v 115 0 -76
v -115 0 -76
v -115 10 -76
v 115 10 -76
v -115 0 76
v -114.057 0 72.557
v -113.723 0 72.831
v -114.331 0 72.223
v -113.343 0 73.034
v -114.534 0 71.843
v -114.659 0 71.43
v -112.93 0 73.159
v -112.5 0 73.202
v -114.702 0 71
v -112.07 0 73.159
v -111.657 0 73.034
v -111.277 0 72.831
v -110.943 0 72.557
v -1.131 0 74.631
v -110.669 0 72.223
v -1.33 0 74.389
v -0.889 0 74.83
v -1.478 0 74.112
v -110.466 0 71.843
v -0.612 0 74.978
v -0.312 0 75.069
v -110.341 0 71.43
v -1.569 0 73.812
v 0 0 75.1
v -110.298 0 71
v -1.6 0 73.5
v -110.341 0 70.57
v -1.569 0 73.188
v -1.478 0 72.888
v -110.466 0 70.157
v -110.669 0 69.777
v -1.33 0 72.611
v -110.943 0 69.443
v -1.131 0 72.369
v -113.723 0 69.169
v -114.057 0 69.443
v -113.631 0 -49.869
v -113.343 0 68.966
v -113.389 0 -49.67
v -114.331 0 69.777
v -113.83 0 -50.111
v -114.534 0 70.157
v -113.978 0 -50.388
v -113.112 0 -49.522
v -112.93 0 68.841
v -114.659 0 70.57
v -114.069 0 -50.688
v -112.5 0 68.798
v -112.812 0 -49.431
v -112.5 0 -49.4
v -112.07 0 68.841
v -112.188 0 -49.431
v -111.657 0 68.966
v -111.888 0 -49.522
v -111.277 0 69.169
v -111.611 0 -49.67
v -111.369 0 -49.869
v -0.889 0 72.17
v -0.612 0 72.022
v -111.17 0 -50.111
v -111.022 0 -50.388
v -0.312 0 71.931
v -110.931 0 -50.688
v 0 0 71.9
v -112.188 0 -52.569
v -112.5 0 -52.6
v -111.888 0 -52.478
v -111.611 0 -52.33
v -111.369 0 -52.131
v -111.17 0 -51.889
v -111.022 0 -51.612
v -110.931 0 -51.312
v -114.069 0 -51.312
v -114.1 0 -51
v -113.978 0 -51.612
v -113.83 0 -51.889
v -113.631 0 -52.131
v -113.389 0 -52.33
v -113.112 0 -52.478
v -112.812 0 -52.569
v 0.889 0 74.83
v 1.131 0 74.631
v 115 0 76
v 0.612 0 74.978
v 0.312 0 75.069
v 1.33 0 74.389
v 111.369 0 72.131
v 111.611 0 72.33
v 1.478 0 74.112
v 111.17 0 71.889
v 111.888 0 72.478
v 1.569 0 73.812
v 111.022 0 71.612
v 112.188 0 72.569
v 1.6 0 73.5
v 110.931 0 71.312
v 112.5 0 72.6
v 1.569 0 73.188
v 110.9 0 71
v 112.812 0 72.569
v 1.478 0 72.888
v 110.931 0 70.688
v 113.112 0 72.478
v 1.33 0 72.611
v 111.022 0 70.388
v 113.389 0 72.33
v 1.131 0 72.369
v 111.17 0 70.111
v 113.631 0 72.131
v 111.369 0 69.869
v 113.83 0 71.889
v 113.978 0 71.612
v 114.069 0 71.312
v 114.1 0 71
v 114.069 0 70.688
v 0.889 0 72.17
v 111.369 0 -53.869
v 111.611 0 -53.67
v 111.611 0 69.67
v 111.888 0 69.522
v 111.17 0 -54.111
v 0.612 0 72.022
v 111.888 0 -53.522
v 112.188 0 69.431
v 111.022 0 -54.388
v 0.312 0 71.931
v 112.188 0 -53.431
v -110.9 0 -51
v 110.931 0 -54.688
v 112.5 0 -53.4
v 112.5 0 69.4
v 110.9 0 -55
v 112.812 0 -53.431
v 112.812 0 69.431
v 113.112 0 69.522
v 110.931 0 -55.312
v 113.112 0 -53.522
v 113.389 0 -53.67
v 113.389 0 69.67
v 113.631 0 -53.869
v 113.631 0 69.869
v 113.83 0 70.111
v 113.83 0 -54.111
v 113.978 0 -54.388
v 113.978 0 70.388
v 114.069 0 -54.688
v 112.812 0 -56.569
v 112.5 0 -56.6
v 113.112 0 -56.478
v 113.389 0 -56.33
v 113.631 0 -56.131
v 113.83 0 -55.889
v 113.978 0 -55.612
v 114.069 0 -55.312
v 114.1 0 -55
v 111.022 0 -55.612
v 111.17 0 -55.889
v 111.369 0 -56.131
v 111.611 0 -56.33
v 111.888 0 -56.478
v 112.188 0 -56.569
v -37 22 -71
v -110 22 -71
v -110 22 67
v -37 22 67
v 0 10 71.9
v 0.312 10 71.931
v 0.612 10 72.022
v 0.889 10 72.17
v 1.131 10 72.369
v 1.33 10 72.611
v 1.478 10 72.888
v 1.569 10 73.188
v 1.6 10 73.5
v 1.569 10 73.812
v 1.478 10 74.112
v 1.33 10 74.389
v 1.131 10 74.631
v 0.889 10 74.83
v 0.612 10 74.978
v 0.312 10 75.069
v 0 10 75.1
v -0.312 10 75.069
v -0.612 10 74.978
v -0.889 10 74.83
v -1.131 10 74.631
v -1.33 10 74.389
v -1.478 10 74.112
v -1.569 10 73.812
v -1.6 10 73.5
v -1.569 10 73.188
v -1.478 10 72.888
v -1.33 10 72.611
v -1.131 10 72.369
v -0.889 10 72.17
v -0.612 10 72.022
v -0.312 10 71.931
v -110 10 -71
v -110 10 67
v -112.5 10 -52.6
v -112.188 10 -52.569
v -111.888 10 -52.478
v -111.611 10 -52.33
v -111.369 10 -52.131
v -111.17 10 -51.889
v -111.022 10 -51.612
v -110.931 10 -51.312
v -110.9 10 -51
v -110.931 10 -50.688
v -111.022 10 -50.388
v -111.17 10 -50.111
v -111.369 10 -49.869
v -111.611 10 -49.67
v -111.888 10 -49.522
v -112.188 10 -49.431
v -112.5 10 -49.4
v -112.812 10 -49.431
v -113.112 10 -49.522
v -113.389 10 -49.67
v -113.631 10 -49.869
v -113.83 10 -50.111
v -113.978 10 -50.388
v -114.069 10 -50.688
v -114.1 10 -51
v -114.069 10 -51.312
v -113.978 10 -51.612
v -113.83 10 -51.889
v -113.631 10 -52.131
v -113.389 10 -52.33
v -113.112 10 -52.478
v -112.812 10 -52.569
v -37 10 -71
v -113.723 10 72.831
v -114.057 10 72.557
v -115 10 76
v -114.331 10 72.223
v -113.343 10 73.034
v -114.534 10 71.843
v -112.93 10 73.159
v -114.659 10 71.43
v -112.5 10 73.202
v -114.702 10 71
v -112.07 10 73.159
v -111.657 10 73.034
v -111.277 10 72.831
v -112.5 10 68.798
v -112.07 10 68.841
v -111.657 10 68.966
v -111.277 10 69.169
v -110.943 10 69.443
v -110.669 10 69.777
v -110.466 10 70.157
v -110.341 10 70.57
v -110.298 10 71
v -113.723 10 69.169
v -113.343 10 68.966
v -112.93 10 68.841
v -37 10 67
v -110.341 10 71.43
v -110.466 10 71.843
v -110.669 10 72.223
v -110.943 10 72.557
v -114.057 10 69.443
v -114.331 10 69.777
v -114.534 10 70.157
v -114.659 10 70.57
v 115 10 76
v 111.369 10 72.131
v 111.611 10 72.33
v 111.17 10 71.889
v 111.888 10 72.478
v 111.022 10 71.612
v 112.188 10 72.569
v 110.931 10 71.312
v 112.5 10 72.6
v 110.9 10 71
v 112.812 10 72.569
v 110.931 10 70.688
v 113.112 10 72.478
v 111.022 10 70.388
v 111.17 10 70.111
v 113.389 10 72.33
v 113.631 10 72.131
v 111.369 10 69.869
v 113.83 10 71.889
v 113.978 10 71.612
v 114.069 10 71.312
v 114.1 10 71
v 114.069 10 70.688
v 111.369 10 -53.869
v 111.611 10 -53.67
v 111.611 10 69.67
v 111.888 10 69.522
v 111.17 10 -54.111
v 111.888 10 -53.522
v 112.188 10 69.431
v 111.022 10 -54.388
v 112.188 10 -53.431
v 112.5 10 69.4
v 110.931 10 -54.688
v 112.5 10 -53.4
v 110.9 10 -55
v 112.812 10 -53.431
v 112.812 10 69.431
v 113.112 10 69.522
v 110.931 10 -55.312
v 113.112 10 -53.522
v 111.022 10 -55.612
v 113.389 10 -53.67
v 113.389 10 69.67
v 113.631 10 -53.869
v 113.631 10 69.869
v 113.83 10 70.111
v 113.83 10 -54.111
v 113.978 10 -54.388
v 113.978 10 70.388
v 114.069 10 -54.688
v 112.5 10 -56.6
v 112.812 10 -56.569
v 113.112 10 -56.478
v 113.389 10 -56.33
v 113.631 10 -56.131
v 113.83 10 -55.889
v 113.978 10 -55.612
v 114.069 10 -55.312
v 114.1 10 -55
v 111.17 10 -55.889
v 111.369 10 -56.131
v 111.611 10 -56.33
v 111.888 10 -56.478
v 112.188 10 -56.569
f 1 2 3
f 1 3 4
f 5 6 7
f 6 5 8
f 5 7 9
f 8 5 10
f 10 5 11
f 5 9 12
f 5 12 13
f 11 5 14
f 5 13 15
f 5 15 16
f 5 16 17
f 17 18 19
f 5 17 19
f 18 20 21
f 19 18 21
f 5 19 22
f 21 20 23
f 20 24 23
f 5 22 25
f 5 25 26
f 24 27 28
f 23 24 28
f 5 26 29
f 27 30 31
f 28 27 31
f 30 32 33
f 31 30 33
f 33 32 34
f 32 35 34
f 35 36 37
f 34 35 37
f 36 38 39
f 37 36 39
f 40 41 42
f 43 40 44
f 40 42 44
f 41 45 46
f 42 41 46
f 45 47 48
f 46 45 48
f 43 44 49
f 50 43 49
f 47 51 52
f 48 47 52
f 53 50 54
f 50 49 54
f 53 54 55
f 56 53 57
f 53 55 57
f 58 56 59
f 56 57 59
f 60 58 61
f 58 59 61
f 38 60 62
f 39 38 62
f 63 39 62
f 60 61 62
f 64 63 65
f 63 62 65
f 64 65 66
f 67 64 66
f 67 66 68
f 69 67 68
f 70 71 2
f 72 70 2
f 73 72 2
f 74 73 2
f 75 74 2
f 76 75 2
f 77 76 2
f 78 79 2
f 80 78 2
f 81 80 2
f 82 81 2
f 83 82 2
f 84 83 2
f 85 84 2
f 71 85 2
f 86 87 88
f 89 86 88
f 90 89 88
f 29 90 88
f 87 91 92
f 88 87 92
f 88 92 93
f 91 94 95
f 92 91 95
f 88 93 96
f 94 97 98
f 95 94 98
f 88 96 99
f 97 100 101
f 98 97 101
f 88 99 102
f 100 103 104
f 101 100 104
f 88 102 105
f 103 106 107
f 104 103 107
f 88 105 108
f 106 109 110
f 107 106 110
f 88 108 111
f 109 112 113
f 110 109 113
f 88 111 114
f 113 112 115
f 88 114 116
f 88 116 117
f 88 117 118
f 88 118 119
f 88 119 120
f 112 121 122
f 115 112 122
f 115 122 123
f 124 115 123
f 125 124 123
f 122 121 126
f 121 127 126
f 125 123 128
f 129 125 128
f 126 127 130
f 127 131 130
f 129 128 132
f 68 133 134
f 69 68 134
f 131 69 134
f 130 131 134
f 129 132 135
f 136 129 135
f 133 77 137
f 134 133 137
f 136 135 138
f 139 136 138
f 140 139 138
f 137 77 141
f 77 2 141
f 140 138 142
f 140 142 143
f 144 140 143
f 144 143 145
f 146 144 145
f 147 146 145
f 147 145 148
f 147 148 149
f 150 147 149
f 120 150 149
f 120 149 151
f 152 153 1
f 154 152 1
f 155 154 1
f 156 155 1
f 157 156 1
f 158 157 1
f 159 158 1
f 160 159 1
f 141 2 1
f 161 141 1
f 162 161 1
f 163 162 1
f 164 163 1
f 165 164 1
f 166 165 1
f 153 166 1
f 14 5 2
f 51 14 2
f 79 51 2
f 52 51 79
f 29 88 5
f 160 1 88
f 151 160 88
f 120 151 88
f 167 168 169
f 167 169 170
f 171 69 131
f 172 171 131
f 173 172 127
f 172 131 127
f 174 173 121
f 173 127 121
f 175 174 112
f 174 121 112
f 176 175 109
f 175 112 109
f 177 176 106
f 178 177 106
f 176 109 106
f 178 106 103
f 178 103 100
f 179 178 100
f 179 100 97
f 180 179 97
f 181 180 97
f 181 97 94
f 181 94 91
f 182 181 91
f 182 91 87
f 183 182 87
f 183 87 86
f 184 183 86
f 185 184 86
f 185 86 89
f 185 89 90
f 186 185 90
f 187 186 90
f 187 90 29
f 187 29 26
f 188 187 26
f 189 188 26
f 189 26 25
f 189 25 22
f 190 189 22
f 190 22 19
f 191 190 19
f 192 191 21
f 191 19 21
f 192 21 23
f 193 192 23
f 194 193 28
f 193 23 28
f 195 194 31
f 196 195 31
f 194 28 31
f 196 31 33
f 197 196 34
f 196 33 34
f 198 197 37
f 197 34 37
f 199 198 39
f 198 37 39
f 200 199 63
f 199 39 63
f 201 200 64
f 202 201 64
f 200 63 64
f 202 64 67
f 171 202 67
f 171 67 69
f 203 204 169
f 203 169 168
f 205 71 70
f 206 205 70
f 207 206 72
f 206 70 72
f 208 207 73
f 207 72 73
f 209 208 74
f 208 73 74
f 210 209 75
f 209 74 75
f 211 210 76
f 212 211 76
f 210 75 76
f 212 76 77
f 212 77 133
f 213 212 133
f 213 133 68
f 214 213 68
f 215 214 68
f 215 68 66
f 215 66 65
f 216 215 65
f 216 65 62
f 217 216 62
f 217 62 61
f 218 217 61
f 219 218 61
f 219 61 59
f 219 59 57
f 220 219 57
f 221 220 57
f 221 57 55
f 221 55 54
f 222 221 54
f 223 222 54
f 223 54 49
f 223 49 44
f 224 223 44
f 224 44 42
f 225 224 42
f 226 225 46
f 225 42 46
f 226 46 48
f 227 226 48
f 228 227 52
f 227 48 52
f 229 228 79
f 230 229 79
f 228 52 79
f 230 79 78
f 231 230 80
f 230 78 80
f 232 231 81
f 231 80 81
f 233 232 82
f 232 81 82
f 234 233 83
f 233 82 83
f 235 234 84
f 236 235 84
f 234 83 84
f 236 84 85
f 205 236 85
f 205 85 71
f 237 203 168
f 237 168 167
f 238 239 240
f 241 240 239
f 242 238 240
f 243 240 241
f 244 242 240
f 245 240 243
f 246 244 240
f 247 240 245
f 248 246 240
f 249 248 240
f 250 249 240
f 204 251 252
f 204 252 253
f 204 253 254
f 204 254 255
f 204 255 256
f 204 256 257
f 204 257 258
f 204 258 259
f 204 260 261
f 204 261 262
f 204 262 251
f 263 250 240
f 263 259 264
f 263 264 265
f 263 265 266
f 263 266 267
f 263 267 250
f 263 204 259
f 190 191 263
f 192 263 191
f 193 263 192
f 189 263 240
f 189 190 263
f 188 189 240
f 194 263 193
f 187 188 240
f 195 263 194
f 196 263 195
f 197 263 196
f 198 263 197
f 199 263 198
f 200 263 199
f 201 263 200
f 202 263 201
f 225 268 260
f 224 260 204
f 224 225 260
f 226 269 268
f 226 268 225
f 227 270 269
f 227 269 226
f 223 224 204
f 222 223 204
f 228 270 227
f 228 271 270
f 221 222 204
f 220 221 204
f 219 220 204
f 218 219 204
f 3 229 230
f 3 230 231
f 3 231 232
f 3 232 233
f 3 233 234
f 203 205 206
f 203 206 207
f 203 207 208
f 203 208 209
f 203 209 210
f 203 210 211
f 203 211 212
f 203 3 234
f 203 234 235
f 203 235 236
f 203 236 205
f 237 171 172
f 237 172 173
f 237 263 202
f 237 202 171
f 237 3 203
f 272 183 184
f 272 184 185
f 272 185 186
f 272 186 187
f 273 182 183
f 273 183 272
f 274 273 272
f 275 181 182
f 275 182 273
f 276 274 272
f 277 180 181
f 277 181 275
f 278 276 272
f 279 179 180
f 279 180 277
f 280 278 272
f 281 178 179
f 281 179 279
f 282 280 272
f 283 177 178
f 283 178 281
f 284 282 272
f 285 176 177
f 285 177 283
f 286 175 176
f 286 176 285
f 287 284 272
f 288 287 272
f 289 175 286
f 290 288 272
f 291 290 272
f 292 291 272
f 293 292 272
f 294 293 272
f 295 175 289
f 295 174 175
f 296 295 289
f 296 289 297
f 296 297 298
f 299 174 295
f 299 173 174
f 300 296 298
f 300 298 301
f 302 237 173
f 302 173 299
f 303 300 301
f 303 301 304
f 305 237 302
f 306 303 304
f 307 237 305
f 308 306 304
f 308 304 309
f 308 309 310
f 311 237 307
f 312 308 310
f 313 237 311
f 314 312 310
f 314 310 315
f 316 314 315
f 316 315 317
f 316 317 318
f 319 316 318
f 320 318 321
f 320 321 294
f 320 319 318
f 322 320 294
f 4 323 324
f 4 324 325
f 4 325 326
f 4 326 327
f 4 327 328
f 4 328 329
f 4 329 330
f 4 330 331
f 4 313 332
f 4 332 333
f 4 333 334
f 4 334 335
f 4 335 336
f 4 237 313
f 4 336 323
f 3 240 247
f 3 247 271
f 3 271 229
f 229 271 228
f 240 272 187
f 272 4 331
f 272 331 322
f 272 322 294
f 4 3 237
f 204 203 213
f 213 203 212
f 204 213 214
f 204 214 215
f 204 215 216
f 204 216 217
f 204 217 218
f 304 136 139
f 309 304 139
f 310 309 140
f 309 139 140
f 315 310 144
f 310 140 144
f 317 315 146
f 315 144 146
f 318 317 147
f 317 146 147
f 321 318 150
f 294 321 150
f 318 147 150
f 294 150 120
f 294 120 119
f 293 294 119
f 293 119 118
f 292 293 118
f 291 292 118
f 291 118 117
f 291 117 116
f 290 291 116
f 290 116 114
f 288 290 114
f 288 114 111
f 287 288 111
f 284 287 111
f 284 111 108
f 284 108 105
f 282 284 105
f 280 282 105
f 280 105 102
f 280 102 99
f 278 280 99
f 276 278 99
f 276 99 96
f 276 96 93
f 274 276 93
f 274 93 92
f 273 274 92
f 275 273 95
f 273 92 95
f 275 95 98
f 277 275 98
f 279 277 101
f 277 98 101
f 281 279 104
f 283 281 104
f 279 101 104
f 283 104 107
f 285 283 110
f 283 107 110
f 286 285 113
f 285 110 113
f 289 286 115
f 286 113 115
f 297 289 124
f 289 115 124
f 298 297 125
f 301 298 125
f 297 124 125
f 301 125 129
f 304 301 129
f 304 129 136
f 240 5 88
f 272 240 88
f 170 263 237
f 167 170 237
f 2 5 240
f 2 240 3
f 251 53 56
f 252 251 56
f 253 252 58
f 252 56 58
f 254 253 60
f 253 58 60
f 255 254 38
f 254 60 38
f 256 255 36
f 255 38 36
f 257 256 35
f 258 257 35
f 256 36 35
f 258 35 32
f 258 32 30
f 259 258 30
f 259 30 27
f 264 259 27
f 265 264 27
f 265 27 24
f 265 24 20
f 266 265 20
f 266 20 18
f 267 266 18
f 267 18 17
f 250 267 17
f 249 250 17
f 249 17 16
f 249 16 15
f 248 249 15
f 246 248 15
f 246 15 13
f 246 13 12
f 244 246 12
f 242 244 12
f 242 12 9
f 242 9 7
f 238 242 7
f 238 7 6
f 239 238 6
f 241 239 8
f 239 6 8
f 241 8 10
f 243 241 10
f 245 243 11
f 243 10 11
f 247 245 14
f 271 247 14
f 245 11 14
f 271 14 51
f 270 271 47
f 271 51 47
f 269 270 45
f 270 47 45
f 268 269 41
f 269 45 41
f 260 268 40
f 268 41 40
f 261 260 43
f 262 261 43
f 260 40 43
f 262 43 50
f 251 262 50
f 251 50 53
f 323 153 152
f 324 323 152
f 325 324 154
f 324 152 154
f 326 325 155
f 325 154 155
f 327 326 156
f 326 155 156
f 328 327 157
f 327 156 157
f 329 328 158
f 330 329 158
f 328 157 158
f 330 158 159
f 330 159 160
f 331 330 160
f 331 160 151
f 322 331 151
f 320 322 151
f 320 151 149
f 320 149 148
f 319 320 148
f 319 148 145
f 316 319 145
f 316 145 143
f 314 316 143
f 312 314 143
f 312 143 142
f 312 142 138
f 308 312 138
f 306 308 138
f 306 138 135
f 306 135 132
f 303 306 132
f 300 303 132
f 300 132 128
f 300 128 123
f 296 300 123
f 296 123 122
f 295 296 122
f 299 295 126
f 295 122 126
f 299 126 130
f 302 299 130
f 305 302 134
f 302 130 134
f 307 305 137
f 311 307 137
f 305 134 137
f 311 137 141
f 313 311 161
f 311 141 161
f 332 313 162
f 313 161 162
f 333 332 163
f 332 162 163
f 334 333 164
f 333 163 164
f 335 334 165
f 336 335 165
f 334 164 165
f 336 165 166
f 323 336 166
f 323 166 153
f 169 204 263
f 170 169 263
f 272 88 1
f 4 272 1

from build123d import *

# Parameters (mm, degrees)
SKETCH_2_W          = 230
SKETCH_2_H          = 152
EXTRUDE_2_DEPTH     = 10
SKETCH_3_W          = 73
SKETCH_3_H          = 138
EXTRUDE_3_DEPTH     = 12
SKETCH_4_R          = 1.6
SKETCH_4_R_2        = 2.201608842
CUT_EXTRUDE_1_DEPTH = 140.58868149


with BuildPart() as part:
    # 草图2 → 凸台-拉伸2 (new body)
    with BuildSketch(Plane(origin=(0, 0, 0), x_dir=(1, 0, 0), z_dir=(0, 1, 0))):
        Rectangle(SKETCH_2_W, SKETCH_2_H)
    extrude(amount=EXTRUDE_2_DEPTH)

    # 草图3 → 凸台-拉伸3 (add)
    with BuildSketch(Plane(origin=(0, 10, 0), x_dir=(1, 0, 0), z_dir=(0, 1, 0))):
        with Locations((-73.5, 2)):
            Rectangle(SKETCH_3_W, SKETCH_3_H)
    extrude(amount=EXTRUDE_3_DEPTH)

    # 草图4 → 切除-拉伸1 (cut, through all)
    with BuildSketch(Plane.XZ):
        with Locations((0, 73.5)):
            Circle(SKETCH_4_R)
        with Locations((112.5, -55)):
            Circle(SKETCH_4_R)
        with Locations((112.5, 71)):
            Circle(SKETCH_4_R)
        with Locations((-112.5, -51)):
            Circle(SKETCH_4_R)
        with Locations((-112.5, 71)):
            Circle(SKETCH_4_R_2)
    extrude(amount=-CUT_EXTRUDE_1_DEPTH, mode=Mode.SUBTRACT)


solid = part.part
